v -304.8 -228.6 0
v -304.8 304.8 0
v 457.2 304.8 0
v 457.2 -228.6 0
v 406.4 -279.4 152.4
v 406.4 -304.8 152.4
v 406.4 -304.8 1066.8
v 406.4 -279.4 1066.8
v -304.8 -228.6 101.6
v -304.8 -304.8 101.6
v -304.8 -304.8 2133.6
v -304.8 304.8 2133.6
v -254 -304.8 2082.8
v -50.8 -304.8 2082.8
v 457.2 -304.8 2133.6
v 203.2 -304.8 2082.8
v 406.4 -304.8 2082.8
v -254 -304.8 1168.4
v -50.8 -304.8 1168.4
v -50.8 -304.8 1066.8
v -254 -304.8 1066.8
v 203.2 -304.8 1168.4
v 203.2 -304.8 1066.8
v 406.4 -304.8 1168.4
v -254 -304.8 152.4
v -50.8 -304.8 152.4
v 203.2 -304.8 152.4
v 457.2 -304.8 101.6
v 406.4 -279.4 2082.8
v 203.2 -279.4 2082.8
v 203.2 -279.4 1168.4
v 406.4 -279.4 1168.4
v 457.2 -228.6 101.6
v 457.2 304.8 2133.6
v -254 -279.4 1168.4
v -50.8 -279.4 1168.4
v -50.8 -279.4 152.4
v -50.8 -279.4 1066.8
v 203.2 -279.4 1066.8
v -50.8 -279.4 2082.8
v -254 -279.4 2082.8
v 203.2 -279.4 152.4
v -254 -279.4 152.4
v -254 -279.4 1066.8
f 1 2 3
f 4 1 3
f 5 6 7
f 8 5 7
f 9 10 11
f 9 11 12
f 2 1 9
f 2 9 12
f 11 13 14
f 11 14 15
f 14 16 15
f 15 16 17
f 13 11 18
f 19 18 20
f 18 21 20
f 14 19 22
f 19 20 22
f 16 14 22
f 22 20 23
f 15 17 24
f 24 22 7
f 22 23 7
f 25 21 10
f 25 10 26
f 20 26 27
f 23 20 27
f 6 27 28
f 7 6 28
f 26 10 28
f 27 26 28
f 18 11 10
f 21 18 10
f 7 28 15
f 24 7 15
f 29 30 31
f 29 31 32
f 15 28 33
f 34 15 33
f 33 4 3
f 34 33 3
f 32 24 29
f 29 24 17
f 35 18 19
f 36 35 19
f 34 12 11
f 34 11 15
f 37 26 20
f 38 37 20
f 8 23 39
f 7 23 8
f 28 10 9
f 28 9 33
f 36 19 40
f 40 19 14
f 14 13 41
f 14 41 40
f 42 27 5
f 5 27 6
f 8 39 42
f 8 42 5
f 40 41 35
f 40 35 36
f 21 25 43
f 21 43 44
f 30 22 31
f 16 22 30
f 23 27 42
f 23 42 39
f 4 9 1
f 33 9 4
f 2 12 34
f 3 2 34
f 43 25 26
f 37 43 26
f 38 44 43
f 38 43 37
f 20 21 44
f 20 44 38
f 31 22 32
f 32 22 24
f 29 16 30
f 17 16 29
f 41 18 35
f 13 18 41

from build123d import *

# Parameters (mm, degrees)
F0_W     = 762
F0_H     = 609.6
F1_DEPTH = 2133.6
F2_W     = 762
F2_H     = 101.6
F3_DEPTH = 76.2
F4_W     = 203.2
F4_H     = 914.4
F5_DEPTH = 25.4


with BuildPart() as f1:
    # F0 (on Top) → F1 (new body)
    with BuildSketch(Plane.XY):
        with Locations((76.2, 0)):
            Rectangle(F0_W, F0_H)
    extrude(amount=F1_DEPTH)

    # F2 (on face) → F3 (cut)
    with BuildSketch(Plane.XZ.offset(304.8)):
        with Locations((76.2, 50.8)):
            Rectangle(F2_W, F2_H)
    extrude(amount=-F3_DEPTH, mode=Mode.SUBTRACT)

    # F4 (on face) → F5 (cut)
    with BuildSketch(Plane.XZ.offset(304.8)):
        with Locations((-152.4, 1625.6)):
            Rectangle(F4_W, F4_H)
        with Locations((304.8, 1625.6)):
            Rectangle(F4_W, F4_H)
        with Locations((304.8, 609.6)):
            Rectangle(F4_W, F4_H)
        with Locations((-152.4, 609.6)):
            Rectangle(F4_W, F4_H)
    extrude(amount=-F5_DEPTH, mode=Mode.SUBTRACT)


solid = f1.part
